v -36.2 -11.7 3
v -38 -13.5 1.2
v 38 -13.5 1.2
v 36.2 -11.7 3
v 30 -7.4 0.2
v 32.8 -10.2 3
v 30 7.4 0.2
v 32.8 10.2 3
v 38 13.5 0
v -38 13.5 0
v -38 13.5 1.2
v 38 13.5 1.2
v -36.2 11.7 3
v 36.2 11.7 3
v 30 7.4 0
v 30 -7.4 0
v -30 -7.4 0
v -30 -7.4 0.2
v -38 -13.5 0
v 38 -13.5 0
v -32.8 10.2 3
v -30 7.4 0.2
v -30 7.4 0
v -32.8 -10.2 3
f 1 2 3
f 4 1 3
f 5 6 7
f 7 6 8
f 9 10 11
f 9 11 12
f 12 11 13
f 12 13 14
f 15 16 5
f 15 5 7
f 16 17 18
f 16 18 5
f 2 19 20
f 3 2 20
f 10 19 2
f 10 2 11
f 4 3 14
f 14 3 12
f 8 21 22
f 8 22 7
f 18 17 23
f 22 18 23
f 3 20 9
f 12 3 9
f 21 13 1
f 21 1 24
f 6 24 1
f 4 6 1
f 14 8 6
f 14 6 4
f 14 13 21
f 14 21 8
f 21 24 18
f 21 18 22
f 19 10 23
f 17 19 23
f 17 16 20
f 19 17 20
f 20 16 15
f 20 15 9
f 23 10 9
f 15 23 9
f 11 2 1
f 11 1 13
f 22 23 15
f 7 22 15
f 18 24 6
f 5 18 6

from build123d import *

# Parameters (mm, degrees)
F0_W     = 76
F0_H     = 27
F0_W_2   = 60
F0_H_2   = 14.8
F1_DEPTH = 3
F2_SIZE  = 2.8
F3_SIZE  = 1.8


with BuildPart() as f1:
    # F0 (on Top) → F1 (new body)
    with BuildSketch(Plane.XY):
        Rectangle(F0_W, F0_H)
        Rectangle(F0_W_2, F0_H_2, mode=Mode.SUBTRACT)
    extrude(amount=F1_DEPTH)

    # F2
    f2_edges = [f1.edges().sort_by_distance(p)[0] for p in [
        (0, 7.4, 3),
        (30, 0, 3),
        (0, -7.4, 3),
        (-30, 0, 3),
    ]]
    chamfer(f2_edges, length=F2_SIZE)

    # F3
    f3_edges = [f1.edges().sort_by_distance(p)[0] for p in [
        (0, 13.5, 3),
        (-38, 0, 3),
        (0, -13.5, 3),
        (38, 0, 3),
    ]]
    chamfer(f3_edges, length=F3_SIZE)


solid = f1.part
